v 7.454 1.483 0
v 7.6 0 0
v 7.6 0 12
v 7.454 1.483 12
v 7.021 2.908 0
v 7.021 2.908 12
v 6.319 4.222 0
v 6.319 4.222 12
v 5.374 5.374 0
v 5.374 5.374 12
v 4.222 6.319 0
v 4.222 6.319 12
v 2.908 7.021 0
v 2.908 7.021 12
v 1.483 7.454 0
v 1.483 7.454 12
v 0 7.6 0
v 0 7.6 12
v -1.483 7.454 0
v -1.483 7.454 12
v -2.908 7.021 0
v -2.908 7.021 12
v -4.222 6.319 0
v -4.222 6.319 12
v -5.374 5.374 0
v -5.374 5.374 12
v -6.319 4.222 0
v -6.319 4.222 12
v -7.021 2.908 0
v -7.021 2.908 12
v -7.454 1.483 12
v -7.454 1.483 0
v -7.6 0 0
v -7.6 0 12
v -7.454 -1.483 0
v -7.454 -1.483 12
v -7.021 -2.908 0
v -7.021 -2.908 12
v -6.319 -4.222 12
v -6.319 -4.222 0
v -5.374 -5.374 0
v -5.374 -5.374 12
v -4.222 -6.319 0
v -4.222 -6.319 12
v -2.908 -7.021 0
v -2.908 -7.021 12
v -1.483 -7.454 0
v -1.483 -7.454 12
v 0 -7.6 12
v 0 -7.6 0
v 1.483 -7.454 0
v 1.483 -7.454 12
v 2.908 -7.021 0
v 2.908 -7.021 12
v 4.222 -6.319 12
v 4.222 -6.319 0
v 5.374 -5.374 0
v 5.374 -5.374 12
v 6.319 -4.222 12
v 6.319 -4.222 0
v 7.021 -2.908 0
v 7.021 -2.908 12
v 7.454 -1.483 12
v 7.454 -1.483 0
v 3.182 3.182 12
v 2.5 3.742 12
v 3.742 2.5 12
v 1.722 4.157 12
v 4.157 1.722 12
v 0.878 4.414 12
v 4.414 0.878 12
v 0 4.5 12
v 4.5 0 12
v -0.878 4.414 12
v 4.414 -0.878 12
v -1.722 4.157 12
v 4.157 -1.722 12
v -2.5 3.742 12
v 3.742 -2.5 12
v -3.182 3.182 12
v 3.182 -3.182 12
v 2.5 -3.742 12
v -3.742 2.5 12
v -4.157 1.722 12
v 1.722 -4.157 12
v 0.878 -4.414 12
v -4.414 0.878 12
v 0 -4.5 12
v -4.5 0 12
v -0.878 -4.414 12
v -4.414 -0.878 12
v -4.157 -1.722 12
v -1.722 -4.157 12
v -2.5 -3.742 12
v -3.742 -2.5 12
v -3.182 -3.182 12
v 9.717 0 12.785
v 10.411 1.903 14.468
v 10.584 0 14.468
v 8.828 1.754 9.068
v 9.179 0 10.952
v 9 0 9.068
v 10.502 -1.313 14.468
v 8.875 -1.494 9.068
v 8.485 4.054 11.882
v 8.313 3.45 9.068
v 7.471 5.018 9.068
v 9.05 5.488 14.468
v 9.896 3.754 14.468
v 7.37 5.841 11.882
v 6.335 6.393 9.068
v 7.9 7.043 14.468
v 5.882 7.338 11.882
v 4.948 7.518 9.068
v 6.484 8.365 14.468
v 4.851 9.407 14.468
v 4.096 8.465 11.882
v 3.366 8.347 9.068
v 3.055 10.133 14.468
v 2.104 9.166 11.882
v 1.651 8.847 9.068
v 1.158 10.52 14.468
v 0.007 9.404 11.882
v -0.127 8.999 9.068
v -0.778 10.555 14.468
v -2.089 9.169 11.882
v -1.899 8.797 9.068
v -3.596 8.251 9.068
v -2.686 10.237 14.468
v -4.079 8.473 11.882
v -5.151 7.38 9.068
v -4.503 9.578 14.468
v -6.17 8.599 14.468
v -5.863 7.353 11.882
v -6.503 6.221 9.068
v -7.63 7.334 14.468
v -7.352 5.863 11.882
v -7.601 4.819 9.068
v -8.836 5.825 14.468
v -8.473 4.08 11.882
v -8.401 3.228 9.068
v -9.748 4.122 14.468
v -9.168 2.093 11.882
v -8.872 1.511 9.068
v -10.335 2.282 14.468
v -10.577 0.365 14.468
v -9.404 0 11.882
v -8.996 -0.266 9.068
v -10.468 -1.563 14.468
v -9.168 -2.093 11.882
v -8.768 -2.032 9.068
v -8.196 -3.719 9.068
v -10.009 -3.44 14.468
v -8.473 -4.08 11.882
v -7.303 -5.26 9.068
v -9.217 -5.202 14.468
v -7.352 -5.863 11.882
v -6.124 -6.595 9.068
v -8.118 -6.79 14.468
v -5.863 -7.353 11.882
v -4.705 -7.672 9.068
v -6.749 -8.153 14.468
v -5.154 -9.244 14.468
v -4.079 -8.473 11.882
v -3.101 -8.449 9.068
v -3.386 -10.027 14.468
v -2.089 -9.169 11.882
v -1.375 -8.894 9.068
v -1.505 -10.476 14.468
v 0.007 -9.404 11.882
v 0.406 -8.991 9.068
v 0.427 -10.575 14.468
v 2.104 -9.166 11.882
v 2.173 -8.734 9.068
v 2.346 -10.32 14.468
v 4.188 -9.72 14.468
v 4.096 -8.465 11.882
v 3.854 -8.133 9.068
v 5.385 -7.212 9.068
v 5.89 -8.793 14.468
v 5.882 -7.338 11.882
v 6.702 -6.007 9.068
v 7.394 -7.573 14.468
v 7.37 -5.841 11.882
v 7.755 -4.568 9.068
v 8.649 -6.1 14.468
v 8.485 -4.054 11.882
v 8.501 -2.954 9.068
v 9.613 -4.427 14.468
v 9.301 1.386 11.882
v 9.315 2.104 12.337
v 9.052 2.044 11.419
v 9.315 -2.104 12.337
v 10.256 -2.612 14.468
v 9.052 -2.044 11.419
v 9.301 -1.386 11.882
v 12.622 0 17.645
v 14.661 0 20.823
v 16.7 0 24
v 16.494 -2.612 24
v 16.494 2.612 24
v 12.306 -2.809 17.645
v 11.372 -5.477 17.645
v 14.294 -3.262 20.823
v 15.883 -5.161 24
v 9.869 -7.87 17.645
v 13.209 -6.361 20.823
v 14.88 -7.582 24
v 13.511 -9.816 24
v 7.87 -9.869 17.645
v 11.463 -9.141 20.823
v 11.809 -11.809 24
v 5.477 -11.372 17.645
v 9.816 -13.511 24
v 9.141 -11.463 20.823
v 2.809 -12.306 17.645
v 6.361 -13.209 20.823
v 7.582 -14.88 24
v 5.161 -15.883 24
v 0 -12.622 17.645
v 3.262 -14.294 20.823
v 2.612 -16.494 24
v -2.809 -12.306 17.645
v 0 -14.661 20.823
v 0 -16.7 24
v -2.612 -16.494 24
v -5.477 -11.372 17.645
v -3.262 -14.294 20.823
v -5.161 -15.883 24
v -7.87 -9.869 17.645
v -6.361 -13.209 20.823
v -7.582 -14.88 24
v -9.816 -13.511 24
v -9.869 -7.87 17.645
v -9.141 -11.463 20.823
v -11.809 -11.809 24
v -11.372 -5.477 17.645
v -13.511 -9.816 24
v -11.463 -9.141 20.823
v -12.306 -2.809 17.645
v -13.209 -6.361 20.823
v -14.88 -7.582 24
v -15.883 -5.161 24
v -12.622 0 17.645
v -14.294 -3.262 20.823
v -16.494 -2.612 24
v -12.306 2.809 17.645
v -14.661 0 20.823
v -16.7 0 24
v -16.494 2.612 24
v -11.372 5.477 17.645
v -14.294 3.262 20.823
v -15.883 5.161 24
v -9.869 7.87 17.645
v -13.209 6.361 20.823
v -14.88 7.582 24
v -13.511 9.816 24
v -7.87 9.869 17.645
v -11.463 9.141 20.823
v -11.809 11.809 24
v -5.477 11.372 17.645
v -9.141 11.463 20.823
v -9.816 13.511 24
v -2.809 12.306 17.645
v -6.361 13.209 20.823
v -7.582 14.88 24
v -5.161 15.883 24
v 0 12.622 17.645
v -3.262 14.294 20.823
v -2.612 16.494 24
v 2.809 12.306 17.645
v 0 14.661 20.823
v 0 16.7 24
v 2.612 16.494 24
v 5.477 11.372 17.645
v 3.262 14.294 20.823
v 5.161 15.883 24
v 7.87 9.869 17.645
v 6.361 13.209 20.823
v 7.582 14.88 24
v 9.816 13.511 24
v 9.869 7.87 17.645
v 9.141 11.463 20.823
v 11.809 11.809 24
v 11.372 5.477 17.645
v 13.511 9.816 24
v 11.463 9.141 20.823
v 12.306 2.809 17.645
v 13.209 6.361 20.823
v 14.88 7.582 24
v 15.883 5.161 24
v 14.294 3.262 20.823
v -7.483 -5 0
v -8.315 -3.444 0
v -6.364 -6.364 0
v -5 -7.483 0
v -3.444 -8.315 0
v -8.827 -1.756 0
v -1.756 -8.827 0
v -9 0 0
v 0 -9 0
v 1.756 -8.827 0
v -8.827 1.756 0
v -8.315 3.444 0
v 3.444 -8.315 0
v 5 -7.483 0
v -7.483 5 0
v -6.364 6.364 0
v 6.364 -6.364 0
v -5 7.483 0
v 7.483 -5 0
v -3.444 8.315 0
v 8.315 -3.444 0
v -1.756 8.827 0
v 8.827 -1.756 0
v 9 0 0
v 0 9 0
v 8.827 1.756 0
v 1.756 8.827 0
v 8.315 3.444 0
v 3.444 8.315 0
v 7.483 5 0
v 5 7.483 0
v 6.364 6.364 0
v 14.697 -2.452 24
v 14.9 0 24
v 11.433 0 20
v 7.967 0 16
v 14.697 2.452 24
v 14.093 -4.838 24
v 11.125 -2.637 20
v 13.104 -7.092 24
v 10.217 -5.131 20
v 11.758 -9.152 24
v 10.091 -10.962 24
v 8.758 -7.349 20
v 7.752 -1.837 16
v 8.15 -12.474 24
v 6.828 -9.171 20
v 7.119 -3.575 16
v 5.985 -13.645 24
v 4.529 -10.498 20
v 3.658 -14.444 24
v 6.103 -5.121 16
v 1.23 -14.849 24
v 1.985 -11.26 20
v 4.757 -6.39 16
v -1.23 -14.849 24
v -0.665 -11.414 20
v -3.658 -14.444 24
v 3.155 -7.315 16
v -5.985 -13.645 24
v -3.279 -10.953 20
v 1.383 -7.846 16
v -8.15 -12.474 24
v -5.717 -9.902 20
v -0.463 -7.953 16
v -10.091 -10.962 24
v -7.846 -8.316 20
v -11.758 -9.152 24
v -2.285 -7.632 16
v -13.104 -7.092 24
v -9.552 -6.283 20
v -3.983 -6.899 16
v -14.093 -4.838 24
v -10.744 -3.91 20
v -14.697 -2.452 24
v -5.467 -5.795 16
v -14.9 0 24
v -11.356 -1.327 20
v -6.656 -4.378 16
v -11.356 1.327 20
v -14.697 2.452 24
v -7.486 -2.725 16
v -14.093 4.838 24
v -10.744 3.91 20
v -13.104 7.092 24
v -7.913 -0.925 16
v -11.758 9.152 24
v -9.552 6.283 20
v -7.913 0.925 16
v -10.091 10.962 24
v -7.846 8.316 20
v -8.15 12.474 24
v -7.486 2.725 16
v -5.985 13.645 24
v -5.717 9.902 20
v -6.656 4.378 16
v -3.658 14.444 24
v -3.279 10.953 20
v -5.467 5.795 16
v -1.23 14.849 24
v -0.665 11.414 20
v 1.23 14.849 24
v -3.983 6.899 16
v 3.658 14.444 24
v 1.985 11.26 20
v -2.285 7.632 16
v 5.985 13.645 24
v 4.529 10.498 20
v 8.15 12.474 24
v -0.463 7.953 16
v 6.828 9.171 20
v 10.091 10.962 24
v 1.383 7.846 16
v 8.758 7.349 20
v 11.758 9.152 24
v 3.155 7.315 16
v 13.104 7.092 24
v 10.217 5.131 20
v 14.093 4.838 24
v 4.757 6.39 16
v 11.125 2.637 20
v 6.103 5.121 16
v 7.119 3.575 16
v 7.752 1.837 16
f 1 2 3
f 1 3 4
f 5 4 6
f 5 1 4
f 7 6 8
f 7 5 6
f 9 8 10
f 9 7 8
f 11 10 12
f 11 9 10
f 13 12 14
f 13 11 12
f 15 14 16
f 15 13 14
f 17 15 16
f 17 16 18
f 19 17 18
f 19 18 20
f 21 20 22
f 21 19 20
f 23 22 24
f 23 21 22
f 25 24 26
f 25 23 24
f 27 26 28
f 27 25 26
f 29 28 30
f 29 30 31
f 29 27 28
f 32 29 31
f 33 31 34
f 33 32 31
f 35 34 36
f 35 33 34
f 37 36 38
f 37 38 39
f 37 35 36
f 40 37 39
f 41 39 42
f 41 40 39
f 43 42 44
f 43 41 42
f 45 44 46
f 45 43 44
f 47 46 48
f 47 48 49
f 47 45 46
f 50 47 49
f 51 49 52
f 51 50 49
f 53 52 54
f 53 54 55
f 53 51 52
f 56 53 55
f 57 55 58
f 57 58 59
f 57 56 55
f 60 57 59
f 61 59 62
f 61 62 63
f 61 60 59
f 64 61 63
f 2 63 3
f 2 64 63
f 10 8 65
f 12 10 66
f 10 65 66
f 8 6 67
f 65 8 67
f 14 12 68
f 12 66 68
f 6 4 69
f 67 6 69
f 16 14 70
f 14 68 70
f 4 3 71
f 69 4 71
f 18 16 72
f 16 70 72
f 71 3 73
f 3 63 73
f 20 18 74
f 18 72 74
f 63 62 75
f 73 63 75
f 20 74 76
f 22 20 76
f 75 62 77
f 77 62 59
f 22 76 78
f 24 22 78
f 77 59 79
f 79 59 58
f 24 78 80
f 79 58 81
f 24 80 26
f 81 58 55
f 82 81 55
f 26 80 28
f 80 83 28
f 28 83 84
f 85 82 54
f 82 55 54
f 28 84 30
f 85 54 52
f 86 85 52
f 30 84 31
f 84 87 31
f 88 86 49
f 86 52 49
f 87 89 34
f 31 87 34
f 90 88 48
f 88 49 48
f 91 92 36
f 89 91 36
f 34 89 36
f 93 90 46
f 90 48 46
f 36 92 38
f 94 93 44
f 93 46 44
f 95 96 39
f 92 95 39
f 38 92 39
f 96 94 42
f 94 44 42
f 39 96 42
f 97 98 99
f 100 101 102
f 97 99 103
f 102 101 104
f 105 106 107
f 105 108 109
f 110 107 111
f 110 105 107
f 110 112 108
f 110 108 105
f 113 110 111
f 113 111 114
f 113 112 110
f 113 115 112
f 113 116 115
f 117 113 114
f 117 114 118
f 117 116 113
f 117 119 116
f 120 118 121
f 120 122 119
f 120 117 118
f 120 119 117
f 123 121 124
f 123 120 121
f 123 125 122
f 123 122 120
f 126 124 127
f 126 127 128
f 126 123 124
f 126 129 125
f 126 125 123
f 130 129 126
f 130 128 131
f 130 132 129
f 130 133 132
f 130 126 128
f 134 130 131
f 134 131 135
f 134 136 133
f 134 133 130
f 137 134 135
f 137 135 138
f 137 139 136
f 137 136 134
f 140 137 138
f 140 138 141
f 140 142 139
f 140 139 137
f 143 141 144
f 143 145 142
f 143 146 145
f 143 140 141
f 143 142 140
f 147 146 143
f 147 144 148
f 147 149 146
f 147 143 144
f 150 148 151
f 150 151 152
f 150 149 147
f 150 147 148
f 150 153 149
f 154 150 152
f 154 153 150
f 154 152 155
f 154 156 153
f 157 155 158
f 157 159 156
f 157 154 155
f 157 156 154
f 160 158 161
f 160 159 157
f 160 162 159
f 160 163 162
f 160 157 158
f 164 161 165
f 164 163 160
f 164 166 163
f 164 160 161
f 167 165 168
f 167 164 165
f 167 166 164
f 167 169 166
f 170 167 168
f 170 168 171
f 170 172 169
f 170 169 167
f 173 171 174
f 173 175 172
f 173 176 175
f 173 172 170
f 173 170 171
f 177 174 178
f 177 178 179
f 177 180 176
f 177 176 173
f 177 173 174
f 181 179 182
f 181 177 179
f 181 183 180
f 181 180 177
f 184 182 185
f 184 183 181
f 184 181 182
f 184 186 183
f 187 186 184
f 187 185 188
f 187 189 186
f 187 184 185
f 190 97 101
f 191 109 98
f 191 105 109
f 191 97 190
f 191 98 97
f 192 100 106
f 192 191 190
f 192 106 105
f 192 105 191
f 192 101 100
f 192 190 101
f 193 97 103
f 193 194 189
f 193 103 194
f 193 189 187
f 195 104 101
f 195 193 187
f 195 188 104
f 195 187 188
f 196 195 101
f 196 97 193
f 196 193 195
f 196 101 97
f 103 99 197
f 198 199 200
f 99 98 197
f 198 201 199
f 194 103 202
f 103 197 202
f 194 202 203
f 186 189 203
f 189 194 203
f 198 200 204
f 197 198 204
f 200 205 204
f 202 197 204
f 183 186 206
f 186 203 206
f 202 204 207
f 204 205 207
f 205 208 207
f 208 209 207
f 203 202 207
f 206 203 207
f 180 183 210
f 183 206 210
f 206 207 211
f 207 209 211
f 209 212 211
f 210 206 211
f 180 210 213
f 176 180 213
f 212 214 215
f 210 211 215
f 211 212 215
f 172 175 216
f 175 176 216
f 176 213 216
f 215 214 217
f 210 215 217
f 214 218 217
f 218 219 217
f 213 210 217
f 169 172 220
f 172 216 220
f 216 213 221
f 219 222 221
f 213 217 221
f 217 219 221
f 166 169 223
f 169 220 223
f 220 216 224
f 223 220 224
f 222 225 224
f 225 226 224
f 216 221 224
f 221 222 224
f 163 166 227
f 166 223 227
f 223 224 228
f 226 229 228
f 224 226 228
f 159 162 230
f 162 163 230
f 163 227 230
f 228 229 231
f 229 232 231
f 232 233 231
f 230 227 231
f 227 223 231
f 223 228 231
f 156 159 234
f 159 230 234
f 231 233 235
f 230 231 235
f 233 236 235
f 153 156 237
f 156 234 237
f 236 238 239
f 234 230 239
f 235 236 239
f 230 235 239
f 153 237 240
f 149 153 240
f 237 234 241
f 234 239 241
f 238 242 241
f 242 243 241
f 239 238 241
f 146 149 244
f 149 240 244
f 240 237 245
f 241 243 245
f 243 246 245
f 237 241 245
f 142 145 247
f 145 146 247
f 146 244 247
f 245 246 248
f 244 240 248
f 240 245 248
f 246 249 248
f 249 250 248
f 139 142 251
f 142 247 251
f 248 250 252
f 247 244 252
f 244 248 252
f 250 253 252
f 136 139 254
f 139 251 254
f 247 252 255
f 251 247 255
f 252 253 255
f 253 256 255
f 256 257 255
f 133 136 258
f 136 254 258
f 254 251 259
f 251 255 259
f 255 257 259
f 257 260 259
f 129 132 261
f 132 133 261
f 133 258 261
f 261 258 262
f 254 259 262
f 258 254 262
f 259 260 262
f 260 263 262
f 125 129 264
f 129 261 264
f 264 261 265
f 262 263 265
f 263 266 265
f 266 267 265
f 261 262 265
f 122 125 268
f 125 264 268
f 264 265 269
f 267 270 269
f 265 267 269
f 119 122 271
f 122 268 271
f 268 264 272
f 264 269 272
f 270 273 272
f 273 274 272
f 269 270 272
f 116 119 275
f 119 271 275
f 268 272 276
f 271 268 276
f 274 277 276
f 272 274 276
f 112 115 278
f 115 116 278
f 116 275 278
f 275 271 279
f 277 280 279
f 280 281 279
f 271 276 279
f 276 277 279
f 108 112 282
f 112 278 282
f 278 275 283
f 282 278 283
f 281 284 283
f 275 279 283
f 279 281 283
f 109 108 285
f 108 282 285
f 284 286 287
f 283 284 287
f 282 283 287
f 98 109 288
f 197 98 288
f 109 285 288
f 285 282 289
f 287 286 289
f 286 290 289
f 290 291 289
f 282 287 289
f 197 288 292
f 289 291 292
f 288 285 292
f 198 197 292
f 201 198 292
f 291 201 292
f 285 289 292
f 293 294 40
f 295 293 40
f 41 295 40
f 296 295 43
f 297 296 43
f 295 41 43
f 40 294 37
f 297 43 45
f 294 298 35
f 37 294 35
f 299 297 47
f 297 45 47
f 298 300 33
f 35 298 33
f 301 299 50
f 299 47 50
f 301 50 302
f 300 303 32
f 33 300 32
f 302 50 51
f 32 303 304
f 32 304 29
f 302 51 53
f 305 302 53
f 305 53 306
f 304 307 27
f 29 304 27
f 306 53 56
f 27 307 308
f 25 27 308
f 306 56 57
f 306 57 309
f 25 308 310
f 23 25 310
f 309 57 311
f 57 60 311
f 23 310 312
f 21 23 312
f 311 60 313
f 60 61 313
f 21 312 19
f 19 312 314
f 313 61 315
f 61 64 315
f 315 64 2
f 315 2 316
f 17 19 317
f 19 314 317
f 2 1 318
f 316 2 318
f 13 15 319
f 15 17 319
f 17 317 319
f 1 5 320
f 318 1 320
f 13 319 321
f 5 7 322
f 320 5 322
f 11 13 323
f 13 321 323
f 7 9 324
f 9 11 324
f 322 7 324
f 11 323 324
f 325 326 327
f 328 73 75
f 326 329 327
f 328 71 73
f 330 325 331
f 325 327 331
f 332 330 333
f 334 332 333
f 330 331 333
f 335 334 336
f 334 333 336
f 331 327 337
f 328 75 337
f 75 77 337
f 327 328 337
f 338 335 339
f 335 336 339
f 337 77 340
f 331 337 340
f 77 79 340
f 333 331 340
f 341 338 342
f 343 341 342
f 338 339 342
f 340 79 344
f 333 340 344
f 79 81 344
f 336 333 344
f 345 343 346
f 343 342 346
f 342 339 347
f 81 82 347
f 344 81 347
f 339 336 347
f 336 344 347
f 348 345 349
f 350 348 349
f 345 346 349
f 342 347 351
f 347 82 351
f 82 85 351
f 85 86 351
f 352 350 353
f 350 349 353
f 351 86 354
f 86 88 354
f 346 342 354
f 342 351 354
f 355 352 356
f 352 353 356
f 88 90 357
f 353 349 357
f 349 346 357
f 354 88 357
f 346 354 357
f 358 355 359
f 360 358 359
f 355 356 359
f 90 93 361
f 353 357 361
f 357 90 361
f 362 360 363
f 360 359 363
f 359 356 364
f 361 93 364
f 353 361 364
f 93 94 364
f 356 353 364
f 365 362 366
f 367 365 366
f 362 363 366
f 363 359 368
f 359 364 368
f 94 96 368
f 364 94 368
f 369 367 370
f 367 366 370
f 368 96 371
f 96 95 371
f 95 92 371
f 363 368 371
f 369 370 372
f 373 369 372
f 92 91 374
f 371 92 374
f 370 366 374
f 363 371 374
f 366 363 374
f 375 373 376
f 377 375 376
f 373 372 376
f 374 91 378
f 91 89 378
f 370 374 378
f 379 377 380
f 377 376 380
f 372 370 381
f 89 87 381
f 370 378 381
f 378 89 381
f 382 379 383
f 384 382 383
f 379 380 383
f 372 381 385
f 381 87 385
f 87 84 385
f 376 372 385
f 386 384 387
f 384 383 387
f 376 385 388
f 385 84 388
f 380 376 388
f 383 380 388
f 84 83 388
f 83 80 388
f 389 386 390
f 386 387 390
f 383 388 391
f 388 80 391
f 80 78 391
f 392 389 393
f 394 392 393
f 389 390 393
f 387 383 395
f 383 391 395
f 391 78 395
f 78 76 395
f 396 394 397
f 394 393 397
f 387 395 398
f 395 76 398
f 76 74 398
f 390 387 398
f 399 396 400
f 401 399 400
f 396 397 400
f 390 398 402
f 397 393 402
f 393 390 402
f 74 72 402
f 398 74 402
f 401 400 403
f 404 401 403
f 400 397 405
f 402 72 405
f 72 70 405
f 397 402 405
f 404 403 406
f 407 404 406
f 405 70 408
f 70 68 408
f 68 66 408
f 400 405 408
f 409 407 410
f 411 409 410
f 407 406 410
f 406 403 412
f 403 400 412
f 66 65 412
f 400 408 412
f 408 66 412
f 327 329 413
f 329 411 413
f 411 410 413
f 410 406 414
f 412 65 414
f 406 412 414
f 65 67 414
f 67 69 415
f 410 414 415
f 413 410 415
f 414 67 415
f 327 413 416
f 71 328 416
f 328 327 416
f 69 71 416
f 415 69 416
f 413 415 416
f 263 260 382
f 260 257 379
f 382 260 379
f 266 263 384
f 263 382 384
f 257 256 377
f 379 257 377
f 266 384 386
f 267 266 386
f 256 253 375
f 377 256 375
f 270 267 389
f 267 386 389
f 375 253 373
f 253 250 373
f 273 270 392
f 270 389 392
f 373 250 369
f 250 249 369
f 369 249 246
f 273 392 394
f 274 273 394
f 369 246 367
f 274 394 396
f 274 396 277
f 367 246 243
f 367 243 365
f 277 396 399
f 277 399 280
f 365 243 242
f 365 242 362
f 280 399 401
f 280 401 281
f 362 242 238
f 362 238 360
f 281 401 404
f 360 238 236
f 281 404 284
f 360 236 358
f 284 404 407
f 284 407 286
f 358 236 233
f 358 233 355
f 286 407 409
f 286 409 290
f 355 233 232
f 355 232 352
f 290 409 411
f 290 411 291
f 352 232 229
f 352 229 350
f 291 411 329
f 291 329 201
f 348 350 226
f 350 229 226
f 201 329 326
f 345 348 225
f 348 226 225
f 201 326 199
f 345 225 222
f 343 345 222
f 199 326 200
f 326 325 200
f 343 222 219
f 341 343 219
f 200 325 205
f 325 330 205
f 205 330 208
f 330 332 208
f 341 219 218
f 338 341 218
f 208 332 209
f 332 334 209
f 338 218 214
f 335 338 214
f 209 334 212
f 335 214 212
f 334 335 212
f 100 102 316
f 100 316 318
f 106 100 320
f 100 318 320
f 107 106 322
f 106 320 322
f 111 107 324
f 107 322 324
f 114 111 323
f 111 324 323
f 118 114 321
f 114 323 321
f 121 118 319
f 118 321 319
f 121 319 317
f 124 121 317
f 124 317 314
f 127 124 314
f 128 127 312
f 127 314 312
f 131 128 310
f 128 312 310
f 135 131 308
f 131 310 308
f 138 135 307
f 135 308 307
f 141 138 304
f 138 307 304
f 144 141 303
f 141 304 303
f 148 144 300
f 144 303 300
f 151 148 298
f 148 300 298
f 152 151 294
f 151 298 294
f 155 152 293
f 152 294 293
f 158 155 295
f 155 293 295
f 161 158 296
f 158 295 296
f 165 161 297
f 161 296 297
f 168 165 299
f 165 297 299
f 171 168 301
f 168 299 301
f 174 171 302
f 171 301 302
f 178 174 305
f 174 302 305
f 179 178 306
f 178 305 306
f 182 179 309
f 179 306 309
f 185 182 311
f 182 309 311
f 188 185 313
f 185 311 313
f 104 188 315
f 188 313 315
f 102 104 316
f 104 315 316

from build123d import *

# Parameters (mm, degrees)
F0_R     = 9
F0_R_2   = 7.6
F3_DEPTH = 12
F5_R     = 10


# Not quite as in the source:
# - a feature names something its author has since deleted; it is built from what else it names


with BuildPart() as f3:
    # F0 (on Top) → F3 (new body)
    with BuildSketch(Plane.XY):
        Circle(F0_R)
        Circle(F0_R_2, mode=Mode.SUBTRACT)
    extrude(amount=F3_DEPTH)

    # F1 (on Front) → F4 (revolve)
    with BuildSketch(Plane.XZ):
        Polygon((14.9, 24), (4.5, 12), (9, 12), (16.7, 24), align=None)
    revolve(axis=Axis((0, 0, -6.017471198), (0, 0, -1)))

    # F5
    f5_edges = [f3.edges().sort_by_distance(p)[0] for p in [
        (-9, 0, 12),
    ]]
    fillet(f5_edges, radius=F5_R)


solid = f3.part
